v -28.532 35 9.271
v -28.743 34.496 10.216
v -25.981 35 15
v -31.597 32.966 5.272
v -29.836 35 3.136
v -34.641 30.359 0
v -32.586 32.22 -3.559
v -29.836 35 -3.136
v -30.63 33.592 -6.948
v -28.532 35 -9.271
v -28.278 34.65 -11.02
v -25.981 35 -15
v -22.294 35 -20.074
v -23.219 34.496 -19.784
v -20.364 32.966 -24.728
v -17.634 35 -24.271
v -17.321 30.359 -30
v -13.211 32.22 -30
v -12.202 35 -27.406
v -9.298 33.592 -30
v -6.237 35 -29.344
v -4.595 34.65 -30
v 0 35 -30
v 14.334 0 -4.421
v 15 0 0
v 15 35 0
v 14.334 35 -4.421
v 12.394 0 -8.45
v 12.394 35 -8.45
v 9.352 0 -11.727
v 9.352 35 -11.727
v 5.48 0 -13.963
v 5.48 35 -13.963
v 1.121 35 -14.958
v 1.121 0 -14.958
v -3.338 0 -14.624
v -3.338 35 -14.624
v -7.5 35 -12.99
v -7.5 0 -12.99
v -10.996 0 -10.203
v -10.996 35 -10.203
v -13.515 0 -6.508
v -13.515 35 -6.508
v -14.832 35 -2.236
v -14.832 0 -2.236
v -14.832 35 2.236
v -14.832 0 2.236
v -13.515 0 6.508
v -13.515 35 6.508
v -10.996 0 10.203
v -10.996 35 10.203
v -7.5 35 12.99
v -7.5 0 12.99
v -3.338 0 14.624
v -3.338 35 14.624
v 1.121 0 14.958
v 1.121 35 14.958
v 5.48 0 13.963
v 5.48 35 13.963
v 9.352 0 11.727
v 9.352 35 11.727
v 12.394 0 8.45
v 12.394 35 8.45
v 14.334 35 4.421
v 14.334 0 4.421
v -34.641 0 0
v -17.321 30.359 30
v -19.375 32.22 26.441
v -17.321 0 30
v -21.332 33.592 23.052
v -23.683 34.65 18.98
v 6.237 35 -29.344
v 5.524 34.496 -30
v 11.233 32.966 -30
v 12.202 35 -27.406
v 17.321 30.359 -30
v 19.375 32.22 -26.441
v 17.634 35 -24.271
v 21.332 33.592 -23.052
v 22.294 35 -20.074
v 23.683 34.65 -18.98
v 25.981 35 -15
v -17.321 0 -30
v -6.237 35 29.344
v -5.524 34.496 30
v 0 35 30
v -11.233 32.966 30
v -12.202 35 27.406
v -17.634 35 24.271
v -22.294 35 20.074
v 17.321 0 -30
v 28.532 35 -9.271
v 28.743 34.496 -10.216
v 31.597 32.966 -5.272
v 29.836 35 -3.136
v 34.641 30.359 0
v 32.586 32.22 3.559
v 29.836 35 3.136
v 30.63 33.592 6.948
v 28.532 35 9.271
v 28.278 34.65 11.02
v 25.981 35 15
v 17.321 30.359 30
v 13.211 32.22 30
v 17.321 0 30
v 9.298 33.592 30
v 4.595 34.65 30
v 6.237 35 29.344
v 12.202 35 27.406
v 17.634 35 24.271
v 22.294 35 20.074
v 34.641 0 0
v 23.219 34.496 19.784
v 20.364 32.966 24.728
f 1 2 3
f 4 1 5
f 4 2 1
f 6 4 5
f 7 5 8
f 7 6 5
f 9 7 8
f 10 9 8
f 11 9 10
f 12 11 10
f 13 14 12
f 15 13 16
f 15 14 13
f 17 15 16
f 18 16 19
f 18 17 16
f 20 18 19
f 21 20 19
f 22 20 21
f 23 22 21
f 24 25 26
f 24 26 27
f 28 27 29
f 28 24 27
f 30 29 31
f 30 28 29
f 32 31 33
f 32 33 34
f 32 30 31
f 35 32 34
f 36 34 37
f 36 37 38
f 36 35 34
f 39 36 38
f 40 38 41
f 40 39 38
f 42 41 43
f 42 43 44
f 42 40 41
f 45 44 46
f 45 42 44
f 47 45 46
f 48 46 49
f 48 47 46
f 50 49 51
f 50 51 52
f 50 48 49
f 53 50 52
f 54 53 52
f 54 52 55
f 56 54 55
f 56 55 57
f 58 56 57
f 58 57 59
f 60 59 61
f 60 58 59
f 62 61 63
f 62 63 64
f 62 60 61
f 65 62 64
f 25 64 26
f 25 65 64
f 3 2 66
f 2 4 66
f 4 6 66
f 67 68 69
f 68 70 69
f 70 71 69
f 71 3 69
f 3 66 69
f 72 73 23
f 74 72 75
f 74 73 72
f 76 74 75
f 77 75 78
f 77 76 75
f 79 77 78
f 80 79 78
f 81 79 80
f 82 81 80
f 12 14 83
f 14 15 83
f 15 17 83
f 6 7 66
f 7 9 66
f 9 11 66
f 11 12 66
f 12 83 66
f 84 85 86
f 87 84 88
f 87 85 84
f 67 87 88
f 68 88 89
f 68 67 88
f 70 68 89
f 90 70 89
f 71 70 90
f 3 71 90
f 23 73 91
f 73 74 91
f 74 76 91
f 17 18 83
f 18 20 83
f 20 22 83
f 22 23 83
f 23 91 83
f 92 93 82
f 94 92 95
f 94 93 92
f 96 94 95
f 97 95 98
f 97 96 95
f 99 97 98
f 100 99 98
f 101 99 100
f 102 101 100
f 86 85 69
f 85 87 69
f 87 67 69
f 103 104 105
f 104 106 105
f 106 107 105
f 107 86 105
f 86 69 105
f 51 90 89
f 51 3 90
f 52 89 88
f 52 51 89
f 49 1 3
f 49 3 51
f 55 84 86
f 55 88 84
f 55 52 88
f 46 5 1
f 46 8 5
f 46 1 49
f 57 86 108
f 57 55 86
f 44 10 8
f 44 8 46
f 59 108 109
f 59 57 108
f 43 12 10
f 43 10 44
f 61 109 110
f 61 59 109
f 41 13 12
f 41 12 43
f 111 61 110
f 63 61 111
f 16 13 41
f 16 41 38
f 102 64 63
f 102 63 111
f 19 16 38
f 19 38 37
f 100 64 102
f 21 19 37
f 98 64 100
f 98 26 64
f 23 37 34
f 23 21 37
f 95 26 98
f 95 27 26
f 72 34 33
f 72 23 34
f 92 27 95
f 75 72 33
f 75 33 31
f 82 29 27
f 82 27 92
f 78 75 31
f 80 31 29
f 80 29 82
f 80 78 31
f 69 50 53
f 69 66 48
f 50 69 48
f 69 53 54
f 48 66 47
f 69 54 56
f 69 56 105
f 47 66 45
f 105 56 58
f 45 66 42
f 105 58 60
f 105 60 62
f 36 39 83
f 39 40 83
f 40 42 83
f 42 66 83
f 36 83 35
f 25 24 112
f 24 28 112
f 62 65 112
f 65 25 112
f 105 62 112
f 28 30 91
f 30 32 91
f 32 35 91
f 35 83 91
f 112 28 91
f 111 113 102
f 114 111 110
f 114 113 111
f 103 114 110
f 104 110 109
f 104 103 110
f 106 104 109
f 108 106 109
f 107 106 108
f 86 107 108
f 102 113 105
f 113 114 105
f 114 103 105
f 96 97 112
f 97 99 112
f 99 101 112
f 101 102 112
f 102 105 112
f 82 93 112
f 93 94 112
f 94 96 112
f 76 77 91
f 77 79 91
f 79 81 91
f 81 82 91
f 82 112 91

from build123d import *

# Parameters (mm, degrees)
SKETCH1_R           = 15
BOSS_EXTRUDE1_DEPTH = 35
SKETCH2_OUTSIDE_W   = 110.904
SKETCH2_OUTSIDE_H   = 101.622
SKETCH2_OUTSIDE_R   = 30
CUT_EXTRUDE1_DEPTH  = 10
CUT_EXTRUDE1_TAPER  = 45


with BuildPart() as part:
    # Sketch1 → Boss-Extrude1 (new body)
    with BuildSketch(Plane(origin=(0, 0, 0), x_dir=(1, 0, 0), z_dir=(0, 1, 0))):
        Polygon((34.641016151, 0), (17.320508076, 30), (-17.320508076, 30), (-34.641016151, 0), (-17.320508076, -30), (17.320508076, -30), align=None)
        Circle(SKETCH1_R, mode=Mode.SUBTRACT)
    extrude(amount=BOSS_EXTRUDE1_DEPTH)

    # Sketch2 outside → Cut-Extrude1 (cut)
    with BuildSketch(Plane(origin=(0, 35, 0), x_dir=(1, 0, 0), z_dir=(0, 1, 0))):
        Rectangle(SKETCH2_OUTSIDE_W, SKETCH2_OUTSIDE_H)
        Circle(SKETCH2_OUTSIDE_R, mode=Mode.SUBTRACT)
    extrude(amount=-CUT_EXTRUDE1_DEPTH, taper=CUT_EXTRUDE1_TAPER, mode=Mode.SUBTRACT)


solid = part.part
